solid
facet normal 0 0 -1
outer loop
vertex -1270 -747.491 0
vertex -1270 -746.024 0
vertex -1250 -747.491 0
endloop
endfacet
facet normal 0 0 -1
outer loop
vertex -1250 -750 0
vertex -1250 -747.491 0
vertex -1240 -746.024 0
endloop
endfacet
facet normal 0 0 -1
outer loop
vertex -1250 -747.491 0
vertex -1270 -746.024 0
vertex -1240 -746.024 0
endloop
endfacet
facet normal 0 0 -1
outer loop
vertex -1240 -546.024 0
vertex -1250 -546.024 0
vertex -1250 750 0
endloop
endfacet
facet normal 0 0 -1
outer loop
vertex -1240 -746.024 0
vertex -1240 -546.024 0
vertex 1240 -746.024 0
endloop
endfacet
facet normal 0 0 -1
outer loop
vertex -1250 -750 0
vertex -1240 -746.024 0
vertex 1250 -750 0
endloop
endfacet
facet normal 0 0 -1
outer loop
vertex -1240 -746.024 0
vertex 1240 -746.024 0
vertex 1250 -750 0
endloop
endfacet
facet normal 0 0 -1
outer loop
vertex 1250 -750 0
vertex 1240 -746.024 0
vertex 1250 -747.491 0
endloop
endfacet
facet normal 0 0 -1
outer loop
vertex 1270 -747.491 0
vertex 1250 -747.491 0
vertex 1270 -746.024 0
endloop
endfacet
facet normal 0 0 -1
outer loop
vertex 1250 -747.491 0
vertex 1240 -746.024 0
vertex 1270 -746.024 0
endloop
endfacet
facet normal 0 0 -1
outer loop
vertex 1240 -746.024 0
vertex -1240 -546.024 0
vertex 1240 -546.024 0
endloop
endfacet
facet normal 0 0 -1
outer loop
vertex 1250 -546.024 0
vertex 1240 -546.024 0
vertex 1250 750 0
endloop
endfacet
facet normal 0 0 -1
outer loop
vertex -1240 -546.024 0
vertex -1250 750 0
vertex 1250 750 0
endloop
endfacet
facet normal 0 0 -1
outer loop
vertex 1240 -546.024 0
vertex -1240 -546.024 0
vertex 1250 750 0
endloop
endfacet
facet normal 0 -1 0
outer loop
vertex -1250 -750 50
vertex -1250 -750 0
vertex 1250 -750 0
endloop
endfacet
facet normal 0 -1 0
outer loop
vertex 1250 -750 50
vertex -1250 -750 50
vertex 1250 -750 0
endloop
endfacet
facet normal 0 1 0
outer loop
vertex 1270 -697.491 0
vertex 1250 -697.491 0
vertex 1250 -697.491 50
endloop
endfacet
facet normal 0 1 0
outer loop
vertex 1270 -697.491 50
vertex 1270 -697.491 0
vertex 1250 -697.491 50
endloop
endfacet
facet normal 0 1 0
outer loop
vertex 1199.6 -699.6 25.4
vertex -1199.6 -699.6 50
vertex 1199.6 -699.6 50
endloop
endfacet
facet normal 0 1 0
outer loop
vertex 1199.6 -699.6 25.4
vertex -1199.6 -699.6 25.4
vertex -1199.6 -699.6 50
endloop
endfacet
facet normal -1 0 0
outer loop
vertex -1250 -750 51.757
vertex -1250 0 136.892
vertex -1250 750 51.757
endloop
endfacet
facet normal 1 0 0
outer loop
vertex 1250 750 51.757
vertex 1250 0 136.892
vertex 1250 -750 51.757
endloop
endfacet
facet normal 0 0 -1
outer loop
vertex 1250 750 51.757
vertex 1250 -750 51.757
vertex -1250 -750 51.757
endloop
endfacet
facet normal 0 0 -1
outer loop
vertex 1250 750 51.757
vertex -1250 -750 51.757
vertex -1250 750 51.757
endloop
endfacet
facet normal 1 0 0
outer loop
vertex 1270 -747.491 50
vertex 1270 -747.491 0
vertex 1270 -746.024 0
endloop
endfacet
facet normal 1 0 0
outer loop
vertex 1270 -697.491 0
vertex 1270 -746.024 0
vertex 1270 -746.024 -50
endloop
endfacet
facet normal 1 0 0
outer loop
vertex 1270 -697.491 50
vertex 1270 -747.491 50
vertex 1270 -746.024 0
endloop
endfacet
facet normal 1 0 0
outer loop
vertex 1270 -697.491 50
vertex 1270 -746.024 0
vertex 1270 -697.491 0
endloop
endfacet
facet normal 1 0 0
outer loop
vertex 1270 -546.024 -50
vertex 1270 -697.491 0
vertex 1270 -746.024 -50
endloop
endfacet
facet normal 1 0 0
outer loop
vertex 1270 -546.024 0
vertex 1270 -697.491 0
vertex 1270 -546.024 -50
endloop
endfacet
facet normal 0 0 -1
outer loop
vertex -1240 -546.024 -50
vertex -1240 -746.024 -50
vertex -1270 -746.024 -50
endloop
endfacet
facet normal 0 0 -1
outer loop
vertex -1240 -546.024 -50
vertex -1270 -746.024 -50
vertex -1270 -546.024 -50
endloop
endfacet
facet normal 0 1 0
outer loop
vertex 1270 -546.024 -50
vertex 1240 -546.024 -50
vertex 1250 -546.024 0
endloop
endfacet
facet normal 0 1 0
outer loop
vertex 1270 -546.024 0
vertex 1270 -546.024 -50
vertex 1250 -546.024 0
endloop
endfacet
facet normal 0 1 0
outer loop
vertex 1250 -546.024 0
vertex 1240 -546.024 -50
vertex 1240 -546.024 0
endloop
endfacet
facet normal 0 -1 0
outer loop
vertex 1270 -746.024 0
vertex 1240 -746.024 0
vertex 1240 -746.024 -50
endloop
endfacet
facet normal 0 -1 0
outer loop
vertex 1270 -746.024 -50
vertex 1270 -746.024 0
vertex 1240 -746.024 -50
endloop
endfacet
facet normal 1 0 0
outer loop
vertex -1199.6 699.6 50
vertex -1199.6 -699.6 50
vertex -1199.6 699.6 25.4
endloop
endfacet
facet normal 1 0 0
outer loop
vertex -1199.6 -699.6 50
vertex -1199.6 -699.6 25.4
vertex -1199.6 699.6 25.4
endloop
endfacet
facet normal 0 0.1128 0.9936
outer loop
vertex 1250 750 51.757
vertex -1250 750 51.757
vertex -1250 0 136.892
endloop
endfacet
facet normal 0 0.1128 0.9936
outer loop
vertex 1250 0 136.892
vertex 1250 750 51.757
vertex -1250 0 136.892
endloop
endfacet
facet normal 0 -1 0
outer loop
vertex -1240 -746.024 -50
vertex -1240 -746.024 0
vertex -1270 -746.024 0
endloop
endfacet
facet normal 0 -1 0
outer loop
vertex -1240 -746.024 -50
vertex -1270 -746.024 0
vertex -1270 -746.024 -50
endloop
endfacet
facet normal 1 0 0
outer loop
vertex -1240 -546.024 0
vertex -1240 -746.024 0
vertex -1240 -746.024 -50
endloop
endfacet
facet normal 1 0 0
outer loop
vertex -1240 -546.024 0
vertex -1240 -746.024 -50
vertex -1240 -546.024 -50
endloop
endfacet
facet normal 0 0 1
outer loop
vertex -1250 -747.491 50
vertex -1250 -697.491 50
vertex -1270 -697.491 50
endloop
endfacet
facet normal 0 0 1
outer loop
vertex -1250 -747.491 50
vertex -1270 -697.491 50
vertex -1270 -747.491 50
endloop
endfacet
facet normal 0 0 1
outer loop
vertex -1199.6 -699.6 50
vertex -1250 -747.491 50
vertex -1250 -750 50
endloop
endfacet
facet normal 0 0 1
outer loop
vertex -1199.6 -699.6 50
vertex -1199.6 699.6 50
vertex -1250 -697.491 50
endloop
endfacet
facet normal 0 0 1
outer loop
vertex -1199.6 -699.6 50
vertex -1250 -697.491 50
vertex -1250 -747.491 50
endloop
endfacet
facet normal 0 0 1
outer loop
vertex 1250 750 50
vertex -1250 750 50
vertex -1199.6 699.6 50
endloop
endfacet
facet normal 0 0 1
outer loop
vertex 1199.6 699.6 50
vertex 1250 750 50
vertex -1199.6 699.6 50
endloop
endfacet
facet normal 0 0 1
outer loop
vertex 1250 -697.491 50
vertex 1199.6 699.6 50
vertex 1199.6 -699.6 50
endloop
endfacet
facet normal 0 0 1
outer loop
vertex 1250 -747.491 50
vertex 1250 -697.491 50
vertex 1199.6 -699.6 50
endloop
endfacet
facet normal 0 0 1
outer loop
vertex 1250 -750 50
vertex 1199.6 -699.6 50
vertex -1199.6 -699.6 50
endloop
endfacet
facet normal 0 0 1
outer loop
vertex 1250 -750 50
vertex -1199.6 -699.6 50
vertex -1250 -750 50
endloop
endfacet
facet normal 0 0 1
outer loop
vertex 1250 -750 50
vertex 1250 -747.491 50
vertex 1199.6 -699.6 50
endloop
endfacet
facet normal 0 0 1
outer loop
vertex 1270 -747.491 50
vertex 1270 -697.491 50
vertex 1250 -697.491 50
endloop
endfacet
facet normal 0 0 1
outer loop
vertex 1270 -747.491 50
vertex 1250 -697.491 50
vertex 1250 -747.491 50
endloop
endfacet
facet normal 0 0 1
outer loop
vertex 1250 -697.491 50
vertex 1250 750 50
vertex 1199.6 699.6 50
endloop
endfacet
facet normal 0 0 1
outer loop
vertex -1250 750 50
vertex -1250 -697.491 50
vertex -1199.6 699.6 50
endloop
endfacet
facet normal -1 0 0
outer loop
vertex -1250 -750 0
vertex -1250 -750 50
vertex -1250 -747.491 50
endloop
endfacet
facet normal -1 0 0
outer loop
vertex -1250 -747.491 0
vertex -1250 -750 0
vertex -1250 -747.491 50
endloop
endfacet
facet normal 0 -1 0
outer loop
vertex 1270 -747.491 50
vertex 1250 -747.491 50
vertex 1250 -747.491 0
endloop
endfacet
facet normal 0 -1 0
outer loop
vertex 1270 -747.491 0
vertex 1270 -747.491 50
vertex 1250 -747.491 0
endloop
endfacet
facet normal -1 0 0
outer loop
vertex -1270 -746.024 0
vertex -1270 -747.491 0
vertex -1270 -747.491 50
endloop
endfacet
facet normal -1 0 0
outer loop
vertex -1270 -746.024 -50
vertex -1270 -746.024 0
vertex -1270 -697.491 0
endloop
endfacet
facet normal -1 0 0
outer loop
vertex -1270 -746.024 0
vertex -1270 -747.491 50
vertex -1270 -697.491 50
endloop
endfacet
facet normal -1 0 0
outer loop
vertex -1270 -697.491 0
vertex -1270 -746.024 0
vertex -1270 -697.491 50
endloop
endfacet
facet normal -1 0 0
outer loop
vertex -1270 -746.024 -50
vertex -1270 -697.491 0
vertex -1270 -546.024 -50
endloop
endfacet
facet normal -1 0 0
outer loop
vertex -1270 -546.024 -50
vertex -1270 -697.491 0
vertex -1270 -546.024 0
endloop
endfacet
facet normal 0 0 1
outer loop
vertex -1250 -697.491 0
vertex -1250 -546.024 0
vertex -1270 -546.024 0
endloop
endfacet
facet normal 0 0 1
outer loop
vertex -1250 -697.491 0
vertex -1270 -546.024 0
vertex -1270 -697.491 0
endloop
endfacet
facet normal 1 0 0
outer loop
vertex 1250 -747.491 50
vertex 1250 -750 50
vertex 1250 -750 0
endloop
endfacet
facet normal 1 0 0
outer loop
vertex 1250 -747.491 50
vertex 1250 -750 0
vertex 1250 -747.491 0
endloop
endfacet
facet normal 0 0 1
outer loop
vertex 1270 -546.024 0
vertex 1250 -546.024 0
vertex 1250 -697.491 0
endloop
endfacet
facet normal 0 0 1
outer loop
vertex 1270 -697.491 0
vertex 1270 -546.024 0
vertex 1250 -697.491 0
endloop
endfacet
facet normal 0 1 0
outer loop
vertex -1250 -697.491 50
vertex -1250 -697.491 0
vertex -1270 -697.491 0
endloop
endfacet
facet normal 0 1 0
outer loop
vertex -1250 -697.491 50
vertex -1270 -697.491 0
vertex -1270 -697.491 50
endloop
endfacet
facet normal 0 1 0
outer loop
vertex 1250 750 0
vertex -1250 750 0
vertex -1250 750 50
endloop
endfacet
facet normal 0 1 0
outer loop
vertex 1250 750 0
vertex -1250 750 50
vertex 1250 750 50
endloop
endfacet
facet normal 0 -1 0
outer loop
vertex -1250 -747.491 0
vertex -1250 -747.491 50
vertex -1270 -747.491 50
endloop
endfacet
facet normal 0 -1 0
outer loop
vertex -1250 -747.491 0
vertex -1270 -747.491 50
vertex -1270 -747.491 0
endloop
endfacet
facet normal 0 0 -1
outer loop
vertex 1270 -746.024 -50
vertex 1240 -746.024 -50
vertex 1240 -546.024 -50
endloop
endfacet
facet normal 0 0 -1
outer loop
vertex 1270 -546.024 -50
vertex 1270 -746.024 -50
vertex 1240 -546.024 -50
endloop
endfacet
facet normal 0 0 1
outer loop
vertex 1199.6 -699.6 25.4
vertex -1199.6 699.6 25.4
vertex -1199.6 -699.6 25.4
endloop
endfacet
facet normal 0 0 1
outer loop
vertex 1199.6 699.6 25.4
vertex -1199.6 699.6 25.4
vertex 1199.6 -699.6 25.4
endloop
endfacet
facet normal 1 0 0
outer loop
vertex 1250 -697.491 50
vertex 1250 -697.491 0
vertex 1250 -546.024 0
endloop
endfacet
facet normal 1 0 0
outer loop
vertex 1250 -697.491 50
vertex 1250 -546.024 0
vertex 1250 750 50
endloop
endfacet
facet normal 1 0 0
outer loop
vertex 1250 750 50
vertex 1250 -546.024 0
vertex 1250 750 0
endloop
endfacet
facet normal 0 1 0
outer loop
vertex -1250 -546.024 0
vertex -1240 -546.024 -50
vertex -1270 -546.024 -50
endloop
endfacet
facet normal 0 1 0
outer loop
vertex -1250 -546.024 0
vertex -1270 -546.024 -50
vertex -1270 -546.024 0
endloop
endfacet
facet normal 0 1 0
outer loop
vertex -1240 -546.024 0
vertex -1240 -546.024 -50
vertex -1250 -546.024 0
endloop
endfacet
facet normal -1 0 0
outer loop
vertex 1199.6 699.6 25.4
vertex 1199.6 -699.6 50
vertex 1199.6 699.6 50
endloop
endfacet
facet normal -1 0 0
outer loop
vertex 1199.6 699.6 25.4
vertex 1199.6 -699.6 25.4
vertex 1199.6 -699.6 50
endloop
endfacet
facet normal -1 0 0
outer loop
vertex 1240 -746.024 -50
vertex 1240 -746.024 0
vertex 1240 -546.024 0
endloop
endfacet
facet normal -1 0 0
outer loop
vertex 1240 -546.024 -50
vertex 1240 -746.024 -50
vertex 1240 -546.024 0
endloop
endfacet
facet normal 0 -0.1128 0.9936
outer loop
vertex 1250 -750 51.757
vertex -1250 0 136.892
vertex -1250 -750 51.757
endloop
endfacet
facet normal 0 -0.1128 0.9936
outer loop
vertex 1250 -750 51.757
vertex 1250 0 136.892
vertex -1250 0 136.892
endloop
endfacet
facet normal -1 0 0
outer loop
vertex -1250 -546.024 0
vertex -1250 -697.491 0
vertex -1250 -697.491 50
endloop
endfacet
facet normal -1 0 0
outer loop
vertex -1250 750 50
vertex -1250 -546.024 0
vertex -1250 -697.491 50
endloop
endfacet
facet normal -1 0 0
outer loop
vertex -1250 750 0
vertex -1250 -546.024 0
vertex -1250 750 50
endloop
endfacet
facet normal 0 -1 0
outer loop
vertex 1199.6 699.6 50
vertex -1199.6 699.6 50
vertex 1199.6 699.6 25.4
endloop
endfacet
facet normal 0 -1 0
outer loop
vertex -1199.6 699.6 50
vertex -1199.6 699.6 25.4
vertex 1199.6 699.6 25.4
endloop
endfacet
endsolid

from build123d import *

# Parameters (mm, degrees)
F0_W     = 2450
F0_H     = 1450
F1_DEPTH = 50
F2_T     = -25.4
F0_W_2   = 2500
F0_H_2   = 1500
F3_DEPTH = 50
F5_DEPTH = 1250
F7_START = -1240
F7_DEPTH = 30
F8_START = 1240
F8_DEPTH = 30


with BuildPart() as f1:
    # F0 (on Top) → F1 (new body)
    with BuildSketch(Plane.XY):
        Rectangle(F0_W, F0_H)
    extrude(amount=F1_DEPTH)

    # F2
    f2_openings = [f1.faces().sort_by_distance(p)[0] for p in [
        (0, 0, 50),
    ]]
    offset(amount=F2_T, openings=f2_openings)

    # F0 (on Top) → F3 (join)
    with BuildSketch(Plane.XY):
        Rectangle(F0_W_2, F0_H_2)
        Rectangle(F0_W, F0_H, mode=Mode.SUBTRACT)
    extrude(amount=F3_DEPTH)

    # F6 (on Right) → F7 (join)
    with BuildSketch(Plane.YZ.offset(F7_START)):
        Polygon((-747.49147892, 0), (-746.0243114761, 0), (-697.49147892, 0), (-697.49147892, 50), (-747.49147892, 50), align=None)
        Polygon((-697.49147892, 0), (-746.0243114761, 0), (-746.0243114761, -50), (-546.0243114761, -50), (-546.0243114761, 0), align=None)
    extrude(amount=-F7_DEPTH)

    # F6 (on Right) → F8 (join)
    with BuildSketch(Plane.YZ.offset(F8_START)):
        Polygon((-747.49147892, 0), (-746.0243114761, 0), (-697.49147892, 0), (-697.49147892, 50), (-747.49147892, 50), align=None)
        Polygon((-697.49147892, 0), (-746.0243114761, 0), (-746.0243114761, -50), (-546.0243114761, -50), (-546.0243114761, 0), align=None)
    extrude(amount=F8_DEPTH)


with BuildPart() as f5:
    # F4 (on Right) → F5 (new body, symmetric)
    with BuildSketch(Plane.YZ):
        Polygon((0, 136.8924013236), (-750, 51.7572501741), (750, 51.7572501741), align=None)
    extrude(amount=F5_DEPTH, both=True)


solid = Compound([f1.part, f5.part])
